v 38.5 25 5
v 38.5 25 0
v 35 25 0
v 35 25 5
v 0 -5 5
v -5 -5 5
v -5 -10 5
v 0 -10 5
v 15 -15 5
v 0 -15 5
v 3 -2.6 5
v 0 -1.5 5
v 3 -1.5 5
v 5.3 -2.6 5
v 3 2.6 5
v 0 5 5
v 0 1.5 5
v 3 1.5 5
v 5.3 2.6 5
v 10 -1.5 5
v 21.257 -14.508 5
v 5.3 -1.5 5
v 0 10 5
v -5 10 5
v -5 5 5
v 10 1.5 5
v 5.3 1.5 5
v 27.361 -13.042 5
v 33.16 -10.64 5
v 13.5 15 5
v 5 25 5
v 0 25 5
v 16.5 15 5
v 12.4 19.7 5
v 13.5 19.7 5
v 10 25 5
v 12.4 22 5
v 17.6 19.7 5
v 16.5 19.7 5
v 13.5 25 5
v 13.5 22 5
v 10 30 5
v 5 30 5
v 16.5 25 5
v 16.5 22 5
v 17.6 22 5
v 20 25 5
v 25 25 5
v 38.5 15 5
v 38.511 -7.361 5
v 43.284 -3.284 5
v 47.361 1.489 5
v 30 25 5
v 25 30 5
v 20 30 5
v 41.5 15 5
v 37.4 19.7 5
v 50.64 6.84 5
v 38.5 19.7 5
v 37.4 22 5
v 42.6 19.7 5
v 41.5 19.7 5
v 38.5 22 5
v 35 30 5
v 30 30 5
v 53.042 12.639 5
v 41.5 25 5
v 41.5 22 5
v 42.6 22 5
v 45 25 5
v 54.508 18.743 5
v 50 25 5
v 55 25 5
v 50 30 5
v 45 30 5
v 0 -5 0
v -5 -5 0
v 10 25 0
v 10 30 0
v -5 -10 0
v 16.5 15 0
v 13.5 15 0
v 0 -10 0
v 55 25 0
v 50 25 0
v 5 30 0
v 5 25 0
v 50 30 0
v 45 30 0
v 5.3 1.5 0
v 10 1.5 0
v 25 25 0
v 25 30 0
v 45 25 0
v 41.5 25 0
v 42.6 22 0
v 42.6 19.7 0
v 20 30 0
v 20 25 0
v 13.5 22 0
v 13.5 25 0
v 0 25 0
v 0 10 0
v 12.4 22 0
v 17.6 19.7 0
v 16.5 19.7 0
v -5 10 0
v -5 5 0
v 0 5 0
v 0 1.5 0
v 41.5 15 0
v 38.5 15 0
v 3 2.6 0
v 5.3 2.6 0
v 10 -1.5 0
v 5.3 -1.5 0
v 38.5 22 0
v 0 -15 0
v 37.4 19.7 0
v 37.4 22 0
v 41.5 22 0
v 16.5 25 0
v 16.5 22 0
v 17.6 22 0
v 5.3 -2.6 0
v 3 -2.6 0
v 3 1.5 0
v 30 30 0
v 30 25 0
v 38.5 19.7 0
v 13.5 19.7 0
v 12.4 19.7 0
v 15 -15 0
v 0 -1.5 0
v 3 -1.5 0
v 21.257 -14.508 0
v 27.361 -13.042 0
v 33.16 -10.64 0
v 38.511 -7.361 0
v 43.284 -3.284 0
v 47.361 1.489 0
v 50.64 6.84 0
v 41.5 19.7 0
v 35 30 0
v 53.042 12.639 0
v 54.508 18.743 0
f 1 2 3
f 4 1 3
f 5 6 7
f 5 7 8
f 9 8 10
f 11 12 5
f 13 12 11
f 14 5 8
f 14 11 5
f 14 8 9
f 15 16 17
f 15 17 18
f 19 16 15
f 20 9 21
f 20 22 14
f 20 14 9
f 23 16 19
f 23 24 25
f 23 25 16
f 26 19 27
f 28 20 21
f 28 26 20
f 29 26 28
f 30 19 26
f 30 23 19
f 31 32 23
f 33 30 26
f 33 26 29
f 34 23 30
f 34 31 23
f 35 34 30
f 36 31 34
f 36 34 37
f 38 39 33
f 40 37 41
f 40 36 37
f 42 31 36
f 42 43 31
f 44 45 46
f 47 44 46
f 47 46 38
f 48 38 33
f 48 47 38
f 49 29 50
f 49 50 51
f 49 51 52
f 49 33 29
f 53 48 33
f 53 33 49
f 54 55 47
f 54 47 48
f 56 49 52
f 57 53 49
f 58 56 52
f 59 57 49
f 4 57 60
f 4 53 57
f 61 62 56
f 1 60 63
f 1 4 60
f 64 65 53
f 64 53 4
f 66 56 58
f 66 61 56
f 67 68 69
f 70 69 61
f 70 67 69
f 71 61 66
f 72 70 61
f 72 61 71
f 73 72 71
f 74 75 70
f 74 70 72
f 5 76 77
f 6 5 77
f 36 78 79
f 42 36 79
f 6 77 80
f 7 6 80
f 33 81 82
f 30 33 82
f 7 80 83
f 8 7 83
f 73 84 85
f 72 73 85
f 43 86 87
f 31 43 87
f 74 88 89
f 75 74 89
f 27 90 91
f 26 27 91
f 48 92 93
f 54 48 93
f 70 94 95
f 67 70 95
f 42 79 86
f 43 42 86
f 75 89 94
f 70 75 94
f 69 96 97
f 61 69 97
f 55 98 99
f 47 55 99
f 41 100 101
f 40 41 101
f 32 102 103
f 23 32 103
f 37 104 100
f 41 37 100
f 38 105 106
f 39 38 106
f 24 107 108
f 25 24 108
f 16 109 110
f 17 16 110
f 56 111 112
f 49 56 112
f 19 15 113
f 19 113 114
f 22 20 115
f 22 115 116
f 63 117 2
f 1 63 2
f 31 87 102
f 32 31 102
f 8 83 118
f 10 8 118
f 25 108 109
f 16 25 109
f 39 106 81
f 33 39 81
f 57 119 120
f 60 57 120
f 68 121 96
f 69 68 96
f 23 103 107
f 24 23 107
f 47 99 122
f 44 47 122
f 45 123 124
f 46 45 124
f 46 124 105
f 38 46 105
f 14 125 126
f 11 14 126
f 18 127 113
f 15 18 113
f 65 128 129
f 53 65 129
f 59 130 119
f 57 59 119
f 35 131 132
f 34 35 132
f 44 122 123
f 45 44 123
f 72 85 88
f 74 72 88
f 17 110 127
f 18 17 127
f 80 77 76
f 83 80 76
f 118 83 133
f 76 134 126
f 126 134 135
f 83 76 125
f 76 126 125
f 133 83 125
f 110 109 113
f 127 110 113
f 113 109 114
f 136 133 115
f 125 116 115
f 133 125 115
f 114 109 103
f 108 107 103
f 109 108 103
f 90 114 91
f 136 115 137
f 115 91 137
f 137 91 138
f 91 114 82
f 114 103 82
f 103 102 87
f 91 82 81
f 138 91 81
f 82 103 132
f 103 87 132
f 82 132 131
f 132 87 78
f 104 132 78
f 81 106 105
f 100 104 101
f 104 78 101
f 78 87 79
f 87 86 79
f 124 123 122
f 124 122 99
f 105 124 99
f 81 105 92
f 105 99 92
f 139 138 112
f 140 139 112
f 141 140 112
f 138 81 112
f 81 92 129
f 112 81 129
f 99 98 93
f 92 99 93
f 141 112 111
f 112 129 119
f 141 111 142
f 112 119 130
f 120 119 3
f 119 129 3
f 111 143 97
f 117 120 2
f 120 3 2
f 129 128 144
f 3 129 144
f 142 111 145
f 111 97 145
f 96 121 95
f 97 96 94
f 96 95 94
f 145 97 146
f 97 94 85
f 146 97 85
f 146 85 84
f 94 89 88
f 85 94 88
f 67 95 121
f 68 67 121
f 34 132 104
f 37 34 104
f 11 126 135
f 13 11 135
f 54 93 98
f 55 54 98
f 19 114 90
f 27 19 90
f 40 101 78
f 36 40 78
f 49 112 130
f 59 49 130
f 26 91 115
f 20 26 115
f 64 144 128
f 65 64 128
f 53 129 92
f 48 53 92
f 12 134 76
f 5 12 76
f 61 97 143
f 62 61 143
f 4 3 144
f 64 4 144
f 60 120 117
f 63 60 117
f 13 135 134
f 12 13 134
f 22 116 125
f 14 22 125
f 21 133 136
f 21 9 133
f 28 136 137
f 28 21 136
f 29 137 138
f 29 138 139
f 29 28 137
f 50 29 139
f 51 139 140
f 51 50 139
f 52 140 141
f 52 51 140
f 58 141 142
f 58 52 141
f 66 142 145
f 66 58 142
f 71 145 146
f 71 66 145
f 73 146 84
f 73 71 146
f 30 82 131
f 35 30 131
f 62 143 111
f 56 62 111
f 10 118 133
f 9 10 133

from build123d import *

# Parameters (mm, degrees)
BOSS_EXTRU_1_DEPTH = 5
CONG_1_R           = 40


with BuildPart() as part:
    # Esquisse1 → Boss.-Extru.1 (new body)
    with BuildSketch(Plane.XY):
        Polygon((0, 25), (0, 10), (-5, 10), (-5, 5), (0, 5), (0, 1.5), (3, 1.5), (3, 2.6), (5.3, 2.6), (5.3, 1.5), (10, 1.5), (10, -1.5), (5.3, -1.5), (5.3, -2.6), (3, -2.6), (3, -1.5), (0, -1.5), (0, -5), (-5, -5), (-5, -10), (0, -10), (0, -15), (55, -15), (55, 25), (50, 25), (50, 30), (45, 30), (45, 25), (41.5, 25), (41.5, 22), (42.6, 22), (42.6, 19.7), (41.5, 19.7), (41.5, 15), (38.5, 15), (38.5, 19.7), (37.4, 19.7), (37.4, 22), (38.5, 22), (38.5, 25), (35, 25), (35, 30), (30, 30), (30, 25), (25, 25), (25, 30), (20, 30), (20, 25), (16.5, 25), (16.5, 22), (17.6, 22), (17.6, 19.7), (16.5, 19.7), (16.5, 15), (13.5, 15), (13.5, 19.7), (12.4, 19.7), (12.4, 22), (13.5, 22), (13.5, 25), (10, 25), (10, 30), (5, 30), (5, 25), align=None)
    extrude(amount=BOSS_EXTRU_1_DEPTH)

    # Congé1
    cong_1_edges = [part.edges().sort_by_distance(p)[0] for p in [
        (55, -15, 2.5),
    ]]
    fillet(cong_1_edges, radius=CONG_1_R - 0.0001)  # a hair under: the kernel refuses the full size


solid = part.part
